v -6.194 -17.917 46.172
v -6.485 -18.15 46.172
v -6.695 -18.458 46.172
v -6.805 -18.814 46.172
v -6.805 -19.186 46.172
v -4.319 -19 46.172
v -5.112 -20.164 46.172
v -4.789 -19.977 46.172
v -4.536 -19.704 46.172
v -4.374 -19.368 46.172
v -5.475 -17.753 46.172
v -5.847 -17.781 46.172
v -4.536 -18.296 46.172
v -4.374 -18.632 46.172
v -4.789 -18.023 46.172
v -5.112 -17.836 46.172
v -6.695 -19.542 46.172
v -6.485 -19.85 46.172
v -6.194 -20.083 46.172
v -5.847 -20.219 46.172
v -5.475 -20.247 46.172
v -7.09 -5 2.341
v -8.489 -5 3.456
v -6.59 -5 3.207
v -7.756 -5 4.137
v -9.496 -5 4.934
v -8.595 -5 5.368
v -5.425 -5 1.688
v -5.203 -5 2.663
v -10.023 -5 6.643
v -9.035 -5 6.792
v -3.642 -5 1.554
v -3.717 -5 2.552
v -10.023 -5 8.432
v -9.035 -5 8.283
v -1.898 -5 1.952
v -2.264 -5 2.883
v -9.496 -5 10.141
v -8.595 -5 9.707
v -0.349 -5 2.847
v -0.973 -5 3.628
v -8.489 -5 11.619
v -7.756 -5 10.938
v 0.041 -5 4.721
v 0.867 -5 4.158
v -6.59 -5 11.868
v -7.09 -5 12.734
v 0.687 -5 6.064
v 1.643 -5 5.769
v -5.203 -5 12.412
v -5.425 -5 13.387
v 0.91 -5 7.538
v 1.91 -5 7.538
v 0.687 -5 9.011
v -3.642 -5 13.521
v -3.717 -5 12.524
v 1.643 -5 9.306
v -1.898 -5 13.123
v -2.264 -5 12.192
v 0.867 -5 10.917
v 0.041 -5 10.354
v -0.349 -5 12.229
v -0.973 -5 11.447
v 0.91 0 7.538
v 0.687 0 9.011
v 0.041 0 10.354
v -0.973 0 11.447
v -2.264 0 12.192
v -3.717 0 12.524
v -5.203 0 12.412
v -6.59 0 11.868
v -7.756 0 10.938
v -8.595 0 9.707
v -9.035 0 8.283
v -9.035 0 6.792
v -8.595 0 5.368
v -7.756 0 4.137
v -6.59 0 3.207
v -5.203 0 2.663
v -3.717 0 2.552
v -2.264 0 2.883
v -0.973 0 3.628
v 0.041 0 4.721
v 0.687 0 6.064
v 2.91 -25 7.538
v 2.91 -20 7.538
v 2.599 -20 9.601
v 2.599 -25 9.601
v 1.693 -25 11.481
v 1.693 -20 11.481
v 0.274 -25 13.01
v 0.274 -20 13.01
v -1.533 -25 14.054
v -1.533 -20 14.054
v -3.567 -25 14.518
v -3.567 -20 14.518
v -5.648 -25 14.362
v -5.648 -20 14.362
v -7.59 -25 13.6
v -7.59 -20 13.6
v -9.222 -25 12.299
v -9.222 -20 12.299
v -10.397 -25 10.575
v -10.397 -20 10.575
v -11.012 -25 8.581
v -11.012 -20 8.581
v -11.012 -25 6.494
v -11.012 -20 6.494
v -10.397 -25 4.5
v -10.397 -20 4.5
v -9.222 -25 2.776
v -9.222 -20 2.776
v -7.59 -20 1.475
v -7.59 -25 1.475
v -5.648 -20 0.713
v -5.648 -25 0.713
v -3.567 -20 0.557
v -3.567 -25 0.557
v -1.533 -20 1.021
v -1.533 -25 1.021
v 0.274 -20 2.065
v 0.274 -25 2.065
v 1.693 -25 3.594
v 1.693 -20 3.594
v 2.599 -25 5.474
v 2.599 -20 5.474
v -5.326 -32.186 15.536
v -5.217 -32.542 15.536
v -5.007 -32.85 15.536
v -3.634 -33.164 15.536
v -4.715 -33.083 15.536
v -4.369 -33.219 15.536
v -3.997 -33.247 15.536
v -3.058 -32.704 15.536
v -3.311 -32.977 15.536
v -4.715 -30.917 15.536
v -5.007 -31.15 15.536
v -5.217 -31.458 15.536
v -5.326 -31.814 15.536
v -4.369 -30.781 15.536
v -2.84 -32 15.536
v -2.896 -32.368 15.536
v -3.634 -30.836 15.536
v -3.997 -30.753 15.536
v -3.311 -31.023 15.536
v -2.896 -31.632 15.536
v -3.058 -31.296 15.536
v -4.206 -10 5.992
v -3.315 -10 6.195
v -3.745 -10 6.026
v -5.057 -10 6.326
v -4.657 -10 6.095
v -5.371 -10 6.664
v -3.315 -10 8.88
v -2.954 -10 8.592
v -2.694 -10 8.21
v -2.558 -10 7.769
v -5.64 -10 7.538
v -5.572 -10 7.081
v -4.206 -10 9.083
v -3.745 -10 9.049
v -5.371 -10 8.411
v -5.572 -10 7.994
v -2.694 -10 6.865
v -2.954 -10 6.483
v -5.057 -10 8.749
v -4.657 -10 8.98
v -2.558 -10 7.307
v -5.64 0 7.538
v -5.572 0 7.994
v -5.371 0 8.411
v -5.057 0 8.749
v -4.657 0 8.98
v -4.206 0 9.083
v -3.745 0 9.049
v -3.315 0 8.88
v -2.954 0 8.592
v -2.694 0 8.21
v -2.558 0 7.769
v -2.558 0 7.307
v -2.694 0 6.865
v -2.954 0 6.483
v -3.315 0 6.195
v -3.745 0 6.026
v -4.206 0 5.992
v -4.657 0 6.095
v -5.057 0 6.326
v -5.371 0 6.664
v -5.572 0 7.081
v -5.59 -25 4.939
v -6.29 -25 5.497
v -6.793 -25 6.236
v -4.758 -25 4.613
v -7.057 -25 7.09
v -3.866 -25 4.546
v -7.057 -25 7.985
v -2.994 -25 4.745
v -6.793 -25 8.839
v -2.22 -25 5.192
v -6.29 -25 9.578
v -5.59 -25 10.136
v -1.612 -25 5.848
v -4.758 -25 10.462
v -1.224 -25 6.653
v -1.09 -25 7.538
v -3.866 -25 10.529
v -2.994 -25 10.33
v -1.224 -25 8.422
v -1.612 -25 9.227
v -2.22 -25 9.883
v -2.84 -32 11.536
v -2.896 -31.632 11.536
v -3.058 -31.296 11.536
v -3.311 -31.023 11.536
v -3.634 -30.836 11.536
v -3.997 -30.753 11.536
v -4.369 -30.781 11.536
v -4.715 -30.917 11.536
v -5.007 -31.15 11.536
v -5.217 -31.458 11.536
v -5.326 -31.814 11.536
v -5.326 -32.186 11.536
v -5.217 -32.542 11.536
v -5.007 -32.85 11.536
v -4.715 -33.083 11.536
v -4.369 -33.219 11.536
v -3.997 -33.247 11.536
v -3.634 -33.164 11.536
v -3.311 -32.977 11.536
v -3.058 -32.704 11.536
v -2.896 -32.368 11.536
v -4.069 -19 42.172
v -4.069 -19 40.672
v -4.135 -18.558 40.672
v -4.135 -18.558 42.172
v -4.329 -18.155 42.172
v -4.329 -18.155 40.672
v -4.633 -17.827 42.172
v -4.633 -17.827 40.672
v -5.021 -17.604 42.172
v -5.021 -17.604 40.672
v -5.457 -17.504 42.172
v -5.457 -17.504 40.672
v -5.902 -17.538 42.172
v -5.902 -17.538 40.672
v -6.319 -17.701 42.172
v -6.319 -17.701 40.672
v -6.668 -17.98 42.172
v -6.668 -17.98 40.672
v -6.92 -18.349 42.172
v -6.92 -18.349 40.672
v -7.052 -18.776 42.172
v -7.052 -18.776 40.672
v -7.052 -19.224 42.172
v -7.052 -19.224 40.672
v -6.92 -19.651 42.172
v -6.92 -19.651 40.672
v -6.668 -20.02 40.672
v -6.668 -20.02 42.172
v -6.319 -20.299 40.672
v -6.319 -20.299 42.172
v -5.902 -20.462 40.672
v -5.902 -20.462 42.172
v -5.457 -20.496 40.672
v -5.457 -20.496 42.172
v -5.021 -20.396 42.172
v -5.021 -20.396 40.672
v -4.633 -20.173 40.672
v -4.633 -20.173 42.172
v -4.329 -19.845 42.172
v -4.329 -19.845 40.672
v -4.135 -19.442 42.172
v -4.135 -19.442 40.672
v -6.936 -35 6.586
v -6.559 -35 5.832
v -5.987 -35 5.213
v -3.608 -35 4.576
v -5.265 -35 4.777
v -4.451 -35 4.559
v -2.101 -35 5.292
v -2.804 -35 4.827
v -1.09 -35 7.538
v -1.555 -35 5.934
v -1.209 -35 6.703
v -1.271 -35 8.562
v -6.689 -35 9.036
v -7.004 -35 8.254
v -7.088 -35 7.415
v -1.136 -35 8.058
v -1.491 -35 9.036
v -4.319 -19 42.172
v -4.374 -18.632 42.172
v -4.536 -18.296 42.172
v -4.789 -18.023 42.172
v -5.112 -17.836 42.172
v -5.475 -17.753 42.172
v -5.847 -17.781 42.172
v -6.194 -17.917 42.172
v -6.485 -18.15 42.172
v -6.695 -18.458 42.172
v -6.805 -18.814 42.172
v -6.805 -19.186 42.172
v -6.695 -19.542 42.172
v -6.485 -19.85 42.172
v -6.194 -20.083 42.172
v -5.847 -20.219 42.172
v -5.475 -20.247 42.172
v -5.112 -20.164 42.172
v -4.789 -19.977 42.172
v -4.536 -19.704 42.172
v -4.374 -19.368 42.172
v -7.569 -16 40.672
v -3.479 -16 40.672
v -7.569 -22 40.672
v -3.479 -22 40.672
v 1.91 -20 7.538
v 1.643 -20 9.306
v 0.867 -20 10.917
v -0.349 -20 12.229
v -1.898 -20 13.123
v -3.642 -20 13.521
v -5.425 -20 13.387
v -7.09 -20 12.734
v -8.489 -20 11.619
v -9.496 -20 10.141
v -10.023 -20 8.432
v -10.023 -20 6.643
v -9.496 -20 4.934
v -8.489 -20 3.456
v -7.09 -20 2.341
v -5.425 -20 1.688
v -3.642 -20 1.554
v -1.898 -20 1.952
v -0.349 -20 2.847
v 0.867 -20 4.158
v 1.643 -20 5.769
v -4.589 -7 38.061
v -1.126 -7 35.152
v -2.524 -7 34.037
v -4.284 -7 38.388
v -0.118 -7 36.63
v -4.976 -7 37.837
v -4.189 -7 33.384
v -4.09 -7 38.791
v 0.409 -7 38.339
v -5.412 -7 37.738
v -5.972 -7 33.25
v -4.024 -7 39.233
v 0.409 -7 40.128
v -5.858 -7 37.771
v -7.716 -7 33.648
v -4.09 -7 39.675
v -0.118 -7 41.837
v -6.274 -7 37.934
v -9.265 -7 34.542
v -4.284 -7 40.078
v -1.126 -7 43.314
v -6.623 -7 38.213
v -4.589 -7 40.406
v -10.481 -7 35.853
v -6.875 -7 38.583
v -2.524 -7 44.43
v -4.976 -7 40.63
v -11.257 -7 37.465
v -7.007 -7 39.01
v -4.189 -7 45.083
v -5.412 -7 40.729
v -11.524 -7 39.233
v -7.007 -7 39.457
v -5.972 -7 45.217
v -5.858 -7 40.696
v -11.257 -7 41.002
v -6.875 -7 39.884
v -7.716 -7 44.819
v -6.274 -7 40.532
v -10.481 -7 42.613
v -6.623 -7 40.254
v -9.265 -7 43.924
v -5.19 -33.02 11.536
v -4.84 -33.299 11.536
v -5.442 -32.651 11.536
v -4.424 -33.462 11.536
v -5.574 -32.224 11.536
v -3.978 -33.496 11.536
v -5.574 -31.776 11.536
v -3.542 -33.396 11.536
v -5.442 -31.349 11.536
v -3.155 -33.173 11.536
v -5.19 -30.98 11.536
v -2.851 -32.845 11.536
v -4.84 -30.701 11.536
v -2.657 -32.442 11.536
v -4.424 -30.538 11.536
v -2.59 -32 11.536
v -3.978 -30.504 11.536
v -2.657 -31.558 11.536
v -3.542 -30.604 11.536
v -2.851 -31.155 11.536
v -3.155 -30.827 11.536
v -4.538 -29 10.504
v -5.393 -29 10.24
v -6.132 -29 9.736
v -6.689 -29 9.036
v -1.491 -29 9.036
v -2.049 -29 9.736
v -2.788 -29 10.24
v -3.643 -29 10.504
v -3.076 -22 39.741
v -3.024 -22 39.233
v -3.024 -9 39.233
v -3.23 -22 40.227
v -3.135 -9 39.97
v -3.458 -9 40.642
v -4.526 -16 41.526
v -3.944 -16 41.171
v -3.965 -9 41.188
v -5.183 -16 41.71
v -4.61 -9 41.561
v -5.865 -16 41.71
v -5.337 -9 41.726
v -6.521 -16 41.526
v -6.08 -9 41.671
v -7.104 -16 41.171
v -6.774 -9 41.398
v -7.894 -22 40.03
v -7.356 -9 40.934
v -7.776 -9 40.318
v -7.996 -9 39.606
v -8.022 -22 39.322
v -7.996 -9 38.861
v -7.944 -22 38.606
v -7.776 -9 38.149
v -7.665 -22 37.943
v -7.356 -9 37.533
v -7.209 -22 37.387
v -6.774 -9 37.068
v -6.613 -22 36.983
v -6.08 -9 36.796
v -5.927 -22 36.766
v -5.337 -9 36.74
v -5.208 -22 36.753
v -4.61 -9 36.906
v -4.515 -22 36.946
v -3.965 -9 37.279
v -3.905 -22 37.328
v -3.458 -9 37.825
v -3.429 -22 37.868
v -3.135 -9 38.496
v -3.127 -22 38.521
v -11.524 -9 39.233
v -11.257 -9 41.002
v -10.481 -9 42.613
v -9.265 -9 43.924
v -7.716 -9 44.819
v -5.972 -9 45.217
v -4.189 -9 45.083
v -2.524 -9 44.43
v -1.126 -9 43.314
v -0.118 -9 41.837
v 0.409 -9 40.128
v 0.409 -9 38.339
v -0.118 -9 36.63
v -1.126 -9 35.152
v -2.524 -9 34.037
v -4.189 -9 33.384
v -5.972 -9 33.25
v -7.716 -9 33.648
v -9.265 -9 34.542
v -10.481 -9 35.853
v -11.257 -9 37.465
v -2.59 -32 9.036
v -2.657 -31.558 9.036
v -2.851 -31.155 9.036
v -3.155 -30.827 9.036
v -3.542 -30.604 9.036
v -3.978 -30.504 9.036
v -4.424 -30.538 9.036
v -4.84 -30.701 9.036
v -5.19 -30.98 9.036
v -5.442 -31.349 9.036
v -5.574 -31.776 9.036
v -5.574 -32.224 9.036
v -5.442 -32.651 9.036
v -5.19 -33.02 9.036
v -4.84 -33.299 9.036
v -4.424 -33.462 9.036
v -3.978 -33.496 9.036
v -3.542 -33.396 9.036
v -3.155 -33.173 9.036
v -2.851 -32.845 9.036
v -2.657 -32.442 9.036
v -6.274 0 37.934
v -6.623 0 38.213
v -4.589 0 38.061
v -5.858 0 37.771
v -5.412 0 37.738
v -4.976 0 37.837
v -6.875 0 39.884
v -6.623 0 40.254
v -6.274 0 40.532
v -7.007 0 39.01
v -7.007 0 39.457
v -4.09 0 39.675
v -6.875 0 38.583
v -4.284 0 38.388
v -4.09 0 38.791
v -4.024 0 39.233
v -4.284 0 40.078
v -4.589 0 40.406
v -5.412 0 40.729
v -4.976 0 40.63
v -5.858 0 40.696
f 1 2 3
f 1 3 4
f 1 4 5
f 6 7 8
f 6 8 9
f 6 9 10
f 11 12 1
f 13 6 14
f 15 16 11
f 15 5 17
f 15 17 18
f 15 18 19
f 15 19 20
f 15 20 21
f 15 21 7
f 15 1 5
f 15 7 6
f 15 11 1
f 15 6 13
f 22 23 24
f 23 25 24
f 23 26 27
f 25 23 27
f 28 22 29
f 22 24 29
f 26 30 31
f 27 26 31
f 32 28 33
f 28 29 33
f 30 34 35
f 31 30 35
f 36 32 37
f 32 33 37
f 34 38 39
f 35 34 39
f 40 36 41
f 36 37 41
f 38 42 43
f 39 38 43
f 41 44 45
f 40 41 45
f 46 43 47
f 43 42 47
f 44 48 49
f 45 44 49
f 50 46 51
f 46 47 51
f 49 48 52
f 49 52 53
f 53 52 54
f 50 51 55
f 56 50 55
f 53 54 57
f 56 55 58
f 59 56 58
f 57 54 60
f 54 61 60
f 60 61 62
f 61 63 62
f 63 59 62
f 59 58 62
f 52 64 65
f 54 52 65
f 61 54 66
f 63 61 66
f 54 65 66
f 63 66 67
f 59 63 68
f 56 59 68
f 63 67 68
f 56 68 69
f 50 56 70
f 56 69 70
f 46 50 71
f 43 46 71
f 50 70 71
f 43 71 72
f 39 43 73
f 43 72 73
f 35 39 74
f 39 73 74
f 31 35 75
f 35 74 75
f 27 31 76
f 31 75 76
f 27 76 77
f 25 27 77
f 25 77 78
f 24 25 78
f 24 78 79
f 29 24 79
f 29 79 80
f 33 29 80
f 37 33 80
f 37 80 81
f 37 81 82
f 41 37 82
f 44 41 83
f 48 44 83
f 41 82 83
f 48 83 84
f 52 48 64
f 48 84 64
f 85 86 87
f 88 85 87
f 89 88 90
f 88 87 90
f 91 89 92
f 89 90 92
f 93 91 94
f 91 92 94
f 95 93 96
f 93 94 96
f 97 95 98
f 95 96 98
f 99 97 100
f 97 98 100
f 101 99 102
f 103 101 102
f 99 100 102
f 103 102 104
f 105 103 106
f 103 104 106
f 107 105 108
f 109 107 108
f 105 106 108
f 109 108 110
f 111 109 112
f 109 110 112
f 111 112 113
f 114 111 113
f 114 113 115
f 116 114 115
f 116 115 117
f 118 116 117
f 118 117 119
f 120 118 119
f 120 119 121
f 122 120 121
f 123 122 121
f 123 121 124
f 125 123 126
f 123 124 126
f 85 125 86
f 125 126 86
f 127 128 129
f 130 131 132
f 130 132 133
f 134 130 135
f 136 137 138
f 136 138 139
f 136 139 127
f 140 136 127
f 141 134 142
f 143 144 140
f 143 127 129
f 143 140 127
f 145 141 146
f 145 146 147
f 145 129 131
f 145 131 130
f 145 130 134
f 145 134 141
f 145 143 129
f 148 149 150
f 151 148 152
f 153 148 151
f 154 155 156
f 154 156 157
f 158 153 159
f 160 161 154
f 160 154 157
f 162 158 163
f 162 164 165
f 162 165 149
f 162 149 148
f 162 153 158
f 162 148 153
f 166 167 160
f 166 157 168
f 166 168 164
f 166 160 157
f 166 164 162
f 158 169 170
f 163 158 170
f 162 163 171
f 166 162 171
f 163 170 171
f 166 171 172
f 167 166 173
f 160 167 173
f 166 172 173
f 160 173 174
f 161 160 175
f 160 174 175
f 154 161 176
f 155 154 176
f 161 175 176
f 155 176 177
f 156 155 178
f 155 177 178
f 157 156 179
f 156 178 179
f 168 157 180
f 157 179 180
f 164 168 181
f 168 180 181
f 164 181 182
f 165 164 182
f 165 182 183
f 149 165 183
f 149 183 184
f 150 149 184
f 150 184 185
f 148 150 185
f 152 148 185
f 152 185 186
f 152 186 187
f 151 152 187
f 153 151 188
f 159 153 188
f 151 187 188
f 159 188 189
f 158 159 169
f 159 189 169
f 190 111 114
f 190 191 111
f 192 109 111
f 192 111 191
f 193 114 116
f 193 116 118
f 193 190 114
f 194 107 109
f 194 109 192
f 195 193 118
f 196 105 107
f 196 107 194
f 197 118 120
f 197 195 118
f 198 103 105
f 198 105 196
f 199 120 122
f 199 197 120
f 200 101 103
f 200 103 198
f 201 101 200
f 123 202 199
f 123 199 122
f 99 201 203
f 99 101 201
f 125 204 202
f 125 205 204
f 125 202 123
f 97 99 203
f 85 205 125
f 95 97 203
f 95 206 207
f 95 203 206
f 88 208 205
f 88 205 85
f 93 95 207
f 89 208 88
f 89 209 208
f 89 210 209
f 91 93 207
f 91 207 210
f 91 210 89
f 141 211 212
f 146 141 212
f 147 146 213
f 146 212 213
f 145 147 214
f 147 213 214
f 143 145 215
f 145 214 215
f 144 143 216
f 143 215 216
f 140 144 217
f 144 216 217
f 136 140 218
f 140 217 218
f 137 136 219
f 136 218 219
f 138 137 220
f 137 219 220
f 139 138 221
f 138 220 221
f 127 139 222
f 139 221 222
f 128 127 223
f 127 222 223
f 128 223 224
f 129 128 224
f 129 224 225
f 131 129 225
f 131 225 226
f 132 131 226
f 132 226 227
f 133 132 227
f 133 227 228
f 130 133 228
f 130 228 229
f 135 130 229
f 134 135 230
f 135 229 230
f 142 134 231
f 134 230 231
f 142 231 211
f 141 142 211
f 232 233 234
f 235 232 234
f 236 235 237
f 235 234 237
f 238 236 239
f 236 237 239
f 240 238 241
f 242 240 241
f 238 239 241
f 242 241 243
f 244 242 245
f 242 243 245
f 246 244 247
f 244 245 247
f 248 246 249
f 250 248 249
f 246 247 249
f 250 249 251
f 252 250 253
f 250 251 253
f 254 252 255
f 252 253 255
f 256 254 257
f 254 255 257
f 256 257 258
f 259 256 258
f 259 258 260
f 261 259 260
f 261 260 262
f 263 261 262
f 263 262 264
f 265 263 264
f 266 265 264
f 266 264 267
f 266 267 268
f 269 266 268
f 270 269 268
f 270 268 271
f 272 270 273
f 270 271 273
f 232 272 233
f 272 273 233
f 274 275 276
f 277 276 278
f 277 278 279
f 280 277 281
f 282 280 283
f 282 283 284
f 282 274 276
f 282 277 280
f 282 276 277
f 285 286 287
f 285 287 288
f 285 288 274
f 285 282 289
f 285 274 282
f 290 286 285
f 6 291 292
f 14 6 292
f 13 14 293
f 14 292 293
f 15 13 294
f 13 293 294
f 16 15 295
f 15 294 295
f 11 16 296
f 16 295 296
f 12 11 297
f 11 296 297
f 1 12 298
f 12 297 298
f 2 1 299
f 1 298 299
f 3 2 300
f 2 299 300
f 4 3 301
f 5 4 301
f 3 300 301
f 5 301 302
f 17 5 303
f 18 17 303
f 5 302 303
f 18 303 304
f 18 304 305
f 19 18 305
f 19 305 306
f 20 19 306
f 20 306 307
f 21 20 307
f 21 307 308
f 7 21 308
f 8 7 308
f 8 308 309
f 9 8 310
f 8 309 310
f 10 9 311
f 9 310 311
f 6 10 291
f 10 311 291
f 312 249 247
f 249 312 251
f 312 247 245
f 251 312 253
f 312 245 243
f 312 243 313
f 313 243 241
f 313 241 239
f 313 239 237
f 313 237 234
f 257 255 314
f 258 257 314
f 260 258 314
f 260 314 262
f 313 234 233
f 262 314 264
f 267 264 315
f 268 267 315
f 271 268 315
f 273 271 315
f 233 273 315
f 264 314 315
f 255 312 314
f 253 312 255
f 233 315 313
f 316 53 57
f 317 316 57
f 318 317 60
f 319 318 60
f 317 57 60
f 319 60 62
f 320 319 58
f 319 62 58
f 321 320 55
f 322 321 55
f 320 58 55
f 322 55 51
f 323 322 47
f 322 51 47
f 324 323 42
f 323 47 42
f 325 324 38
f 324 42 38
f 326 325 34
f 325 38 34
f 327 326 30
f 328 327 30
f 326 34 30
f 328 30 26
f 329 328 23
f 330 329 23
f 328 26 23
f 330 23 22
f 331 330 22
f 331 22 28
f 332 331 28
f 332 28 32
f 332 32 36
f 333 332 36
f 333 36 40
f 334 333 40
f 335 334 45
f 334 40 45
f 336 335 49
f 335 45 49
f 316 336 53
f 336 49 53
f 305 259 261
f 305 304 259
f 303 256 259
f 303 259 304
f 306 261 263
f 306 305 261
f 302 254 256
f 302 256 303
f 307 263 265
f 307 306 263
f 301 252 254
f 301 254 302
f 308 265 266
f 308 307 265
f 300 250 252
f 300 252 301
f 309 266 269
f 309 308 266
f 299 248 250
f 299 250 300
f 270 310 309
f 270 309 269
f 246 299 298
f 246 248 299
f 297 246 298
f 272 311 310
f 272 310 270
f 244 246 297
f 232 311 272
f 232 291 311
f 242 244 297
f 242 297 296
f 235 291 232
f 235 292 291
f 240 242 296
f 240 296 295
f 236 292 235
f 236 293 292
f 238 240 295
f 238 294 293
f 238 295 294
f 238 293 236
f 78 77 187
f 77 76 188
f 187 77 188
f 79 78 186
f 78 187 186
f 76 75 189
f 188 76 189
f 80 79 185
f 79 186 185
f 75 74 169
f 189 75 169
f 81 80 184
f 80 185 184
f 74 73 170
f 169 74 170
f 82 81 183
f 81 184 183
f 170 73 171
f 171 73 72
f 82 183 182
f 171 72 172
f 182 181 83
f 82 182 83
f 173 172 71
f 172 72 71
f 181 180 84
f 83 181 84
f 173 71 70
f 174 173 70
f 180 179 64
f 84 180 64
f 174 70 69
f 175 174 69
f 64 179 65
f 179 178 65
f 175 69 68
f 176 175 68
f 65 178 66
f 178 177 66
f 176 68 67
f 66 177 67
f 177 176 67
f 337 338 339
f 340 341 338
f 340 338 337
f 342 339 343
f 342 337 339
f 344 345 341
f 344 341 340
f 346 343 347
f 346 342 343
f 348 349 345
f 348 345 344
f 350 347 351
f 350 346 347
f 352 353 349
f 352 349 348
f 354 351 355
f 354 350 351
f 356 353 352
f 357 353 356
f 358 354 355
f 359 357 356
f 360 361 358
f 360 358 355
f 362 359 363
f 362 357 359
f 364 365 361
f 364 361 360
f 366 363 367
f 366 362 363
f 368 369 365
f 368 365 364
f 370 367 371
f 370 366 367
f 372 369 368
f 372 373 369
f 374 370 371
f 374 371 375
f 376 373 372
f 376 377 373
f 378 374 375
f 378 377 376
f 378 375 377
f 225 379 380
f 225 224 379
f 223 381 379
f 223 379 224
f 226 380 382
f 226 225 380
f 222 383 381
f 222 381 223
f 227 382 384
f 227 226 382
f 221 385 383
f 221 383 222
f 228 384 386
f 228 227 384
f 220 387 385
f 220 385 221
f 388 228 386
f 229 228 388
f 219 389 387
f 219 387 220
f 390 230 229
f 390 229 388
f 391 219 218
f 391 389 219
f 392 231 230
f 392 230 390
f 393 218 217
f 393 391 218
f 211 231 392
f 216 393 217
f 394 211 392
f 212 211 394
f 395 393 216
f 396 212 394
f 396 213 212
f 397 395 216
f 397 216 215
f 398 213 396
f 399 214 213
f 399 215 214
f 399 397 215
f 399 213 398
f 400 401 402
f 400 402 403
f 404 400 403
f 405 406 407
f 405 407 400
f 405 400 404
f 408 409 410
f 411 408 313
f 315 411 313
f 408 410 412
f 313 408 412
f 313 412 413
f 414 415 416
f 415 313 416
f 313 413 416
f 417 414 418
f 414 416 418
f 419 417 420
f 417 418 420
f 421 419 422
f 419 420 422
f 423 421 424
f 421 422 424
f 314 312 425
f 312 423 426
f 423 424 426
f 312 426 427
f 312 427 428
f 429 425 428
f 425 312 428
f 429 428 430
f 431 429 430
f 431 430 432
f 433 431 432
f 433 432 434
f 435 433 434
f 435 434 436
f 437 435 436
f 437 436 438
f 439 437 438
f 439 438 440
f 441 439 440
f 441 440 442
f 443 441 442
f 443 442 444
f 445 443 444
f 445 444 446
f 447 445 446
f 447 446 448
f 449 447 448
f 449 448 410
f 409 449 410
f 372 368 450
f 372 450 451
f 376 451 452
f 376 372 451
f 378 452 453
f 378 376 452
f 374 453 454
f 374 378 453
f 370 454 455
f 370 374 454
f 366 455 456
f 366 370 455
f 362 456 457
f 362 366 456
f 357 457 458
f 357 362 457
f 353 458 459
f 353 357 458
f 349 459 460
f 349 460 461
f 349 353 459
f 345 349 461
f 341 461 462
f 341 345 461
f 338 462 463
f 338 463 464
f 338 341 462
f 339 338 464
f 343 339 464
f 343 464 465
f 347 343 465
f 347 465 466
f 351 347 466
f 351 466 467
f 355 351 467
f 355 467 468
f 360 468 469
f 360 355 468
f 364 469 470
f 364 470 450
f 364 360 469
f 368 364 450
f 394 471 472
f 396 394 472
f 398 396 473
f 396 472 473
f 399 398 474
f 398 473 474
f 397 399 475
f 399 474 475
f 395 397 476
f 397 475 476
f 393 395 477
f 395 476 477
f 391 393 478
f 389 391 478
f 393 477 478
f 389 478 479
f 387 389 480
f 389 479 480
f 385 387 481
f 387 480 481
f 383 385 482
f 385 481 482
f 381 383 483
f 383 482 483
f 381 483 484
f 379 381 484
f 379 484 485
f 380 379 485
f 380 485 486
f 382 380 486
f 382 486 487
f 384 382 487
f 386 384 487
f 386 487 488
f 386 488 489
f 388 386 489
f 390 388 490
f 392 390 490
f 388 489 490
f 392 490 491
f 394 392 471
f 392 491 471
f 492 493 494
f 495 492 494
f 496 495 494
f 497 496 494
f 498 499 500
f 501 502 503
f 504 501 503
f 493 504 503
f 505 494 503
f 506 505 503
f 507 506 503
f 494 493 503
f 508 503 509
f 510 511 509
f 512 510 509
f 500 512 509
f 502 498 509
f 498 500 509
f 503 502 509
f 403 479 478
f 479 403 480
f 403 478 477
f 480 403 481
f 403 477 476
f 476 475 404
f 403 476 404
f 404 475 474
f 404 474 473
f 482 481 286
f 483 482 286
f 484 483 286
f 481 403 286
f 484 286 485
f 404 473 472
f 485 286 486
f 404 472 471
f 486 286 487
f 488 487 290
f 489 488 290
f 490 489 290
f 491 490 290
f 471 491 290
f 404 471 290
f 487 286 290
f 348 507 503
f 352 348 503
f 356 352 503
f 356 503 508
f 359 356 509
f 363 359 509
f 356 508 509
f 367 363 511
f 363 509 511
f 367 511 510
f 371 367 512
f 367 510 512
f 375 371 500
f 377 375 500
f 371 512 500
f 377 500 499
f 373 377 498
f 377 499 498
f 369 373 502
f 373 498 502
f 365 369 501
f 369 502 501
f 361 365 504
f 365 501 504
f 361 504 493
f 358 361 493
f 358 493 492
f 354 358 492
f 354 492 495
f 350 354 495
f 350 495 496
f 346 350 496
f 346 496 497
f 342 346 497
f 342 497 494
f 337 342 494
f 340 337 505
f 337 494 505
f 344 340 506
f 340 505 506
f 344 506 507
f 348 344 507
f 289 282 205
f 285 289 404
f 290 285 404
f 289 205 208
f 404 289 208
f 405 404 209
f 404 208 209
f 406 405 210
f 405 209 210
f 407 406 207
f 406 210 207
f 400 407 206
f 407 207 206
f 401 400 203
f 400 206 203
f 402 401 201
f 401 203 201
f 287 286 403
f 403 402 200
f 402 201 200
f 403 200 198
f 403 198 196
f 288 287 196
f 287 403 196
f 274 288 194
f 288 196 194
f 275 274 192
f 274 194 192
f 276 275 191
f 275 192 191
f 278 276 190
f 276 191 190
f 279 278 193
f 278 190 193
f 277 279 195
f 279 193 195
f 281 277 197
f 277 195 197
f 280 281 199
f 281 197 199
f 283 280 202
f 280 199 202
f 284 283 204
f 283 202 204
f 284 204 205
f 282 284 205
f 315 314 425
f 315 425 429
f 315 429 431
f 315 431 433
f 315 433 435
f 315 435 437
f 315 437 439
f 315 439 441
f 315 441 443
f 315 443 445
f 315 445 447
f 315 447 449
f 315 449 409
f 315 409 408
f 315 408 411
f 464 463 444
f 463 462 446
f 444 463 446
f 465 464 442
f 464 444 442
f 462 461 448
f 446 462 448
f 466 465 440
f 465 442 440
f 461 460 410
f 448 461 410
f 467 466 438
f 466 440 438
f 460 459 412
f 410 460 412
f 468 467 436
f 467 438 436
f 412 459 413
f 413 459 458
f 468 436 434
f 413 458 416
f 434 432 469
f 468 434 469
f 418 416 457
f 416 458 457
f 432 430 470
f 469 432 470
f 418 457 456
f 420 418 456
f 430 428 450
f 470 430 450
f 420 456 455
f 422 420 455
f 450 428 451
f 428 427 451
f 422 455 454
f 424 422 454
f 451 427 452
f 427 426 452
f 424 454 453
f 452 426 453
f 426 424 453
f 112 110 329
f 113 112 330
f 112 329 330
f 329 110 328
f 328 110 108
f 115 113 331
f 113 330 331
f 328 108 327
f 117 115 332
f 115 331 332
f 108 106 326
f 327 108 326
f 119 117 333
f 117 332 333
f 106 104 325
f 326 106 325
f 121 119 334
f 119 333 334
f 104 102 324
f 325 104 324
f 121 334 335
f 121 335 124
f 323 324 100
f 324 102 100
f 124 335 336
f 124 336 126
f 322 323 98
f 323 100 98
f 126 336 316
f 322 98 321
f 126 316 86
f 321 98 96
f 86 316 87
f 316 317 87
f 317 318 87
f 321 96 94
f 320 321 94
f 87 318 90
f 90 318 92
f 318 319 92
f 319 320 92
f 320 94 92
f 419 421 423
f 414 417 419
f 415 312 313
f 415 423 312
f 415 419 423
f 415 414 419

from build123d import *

# Parameters (mm, degrees)
F0_R      = 1.5
F1_DEPTH  = 7
F2_R      = 2.5
F2_R_2    = 1.5
F3_DEPTH  = 15
F5_DEPTH  = 6
F6_R      = 1.5
F7_DEPTH  = 1.5
F8_R      = 1.25
F9_DEPTH  = 4
F10_R     = 5
F11_DEPTH = 5
F12_R     = 6
F12_R_2   = 5
F13_DEPTH = 15
F14_R     = 7
F14_R_2   = 6
F15_DEPTH = 5
F16_R     = 3
F17_DEPTH = 10
F19_DEPTH = 6
F20_R     = 1.5
F21_DEPTH = 2.5
F22_R     = 1.25
F23_DEPTH = 4
F24_R     = 1.55
F25_DEPTH = 10
F26_R     = 6
F27_DEPTH = 2


with BuildPart() as f1:
    # F0 (on Front) → F1 (new body)
    with BuildSketch(Plane.XZ):
        with Locations((-5.523831, 39.233364)):
            Circle(F0_R)
    extrude(amount=F1_DEPTH)

    # F2 (on face) → F3 (join)
    with BuildSketch(Plane.XZ.offset(7)):
        with Locations((-5.523831, 39.233364)):
            Circle(F2_R)
        with Locations((-5.523831, 39.233364)):
            Circle(F2_R_2, mode=Mode.SUBTRACT)
        with Locations((-5.523831, 39.233364)):
            Circle(F2_R_2)
    extrude(amount=F3_DEPTH)

    # F4 (on face) → F5 (cut)
    with BuildSketch(Plane.XZ.offset(22)):
        with BuildLine():
            ThreePointArc((-3.478991, 40.671638), (-5.523831, 41.733364), (-7.568671, 40.671638))
            Line((-7.568671, 40.671638), (-3.478991, 40.671638))
        make_face()
    extrude(amount=-F5_DEPTH, mode=Mode.SUBTRACT)

    # F6 (on face) → F7 (join)
    with BuildSketch(Plane.XY.offset(40.671638)):
        with Locations((-5.568671, -19)):
            Circle(F6_R)
    extrude(amount=F7_DEPTH)

    # F8 (on face) → F9 (join)
    with BuildSketch(Plane.XY.offset(42.171638)):
        with Locations((-5.568671, -19)):
            Circle(F8_R)
    extrude(amount=F9_DEPTH)

    # F26 (on face) → F27 (join)
    with BuildSketch(Plane(origin=(0, -7, 0), x_dir=(-1, 0, 0), z_dir=(0, 1, 0))):
        with Locations((5.523831, 39.233364)):
            Circle(F26_R)
    extrude(amount=-F27_DEPTH)


with BuildPart() as f11:
    # F10 (on Front) → F11 (new body)
    with BuildSketch(Plane.XZ):
        with Locations((-4.090371, 7.537527)):
            Circle(F10_R)
    extrude(amount=F11_DEPTH)

    # F12 (on face) → F13 (join)
    with BuildSketch(Plane.XZ.offset(5)):
        with Locations((-4.090371, 7.537527)):
            Circle(F12_R)
        with Locations((-4.090371, 7.537527)):
            Circle(F12_R_2, mode=Mode.SUBTRACT)
        with Locations((-4.090371, 7.537527)):
            Circle(F12_R_2)
    extrude(amount=F13_DEPTH)

    # F14 (on face) → F15 (join)
    with BuildSketch(Plane.XZ.offset(20)):
        with Locations((-4.090371, 7.537527)):
            Circle(F14_R)
        with Locations((-4.090371, 7.537527)):
            Circle(F14_R_2, mode=Mode.SUBTRACT)
        with Locations((-4.090371, 7.537527)):
            Circle(F14_R_2)
    extrude(amount=F15_DEPTH)

    # F16 (on face) → F17 (join)
    with BuildSketch(Plane.XZ.offset(25)):
        with Locations((-4.090371, 7.537527)):
            Circle(F16_R)
    extrude(amount=F17_DEPTH)

    # F18 (on face) → F19 (cut)
    with BuildSketch(Plane.XZ.offset(35)):
        with BuildLine():
            ThreePointArc((-1.491391, 9.035961), (-4.090371, 10.537527), (-6.689351, 9.035961))
            Line((-6.689351, 9.035961), (-1.491391, 9.035961))
        make_face()
    extrude(amount=-F19_DEPTH, mode=Mode.SUBTRACT)

    # F20 (on face) → F21 (join)
    with BuildSketch(Plane.XY.offset(9.035961)):
        with Locations((-4.090371, -32)):
            Circle(F20_R)
    extrude(amount=F21_DEPTH)

    # F22 (on face) → F23 (join)
    with BuildSketch(Plane.XY.offset(11.535961)):
        with Locations((-4.090371, -32)):
            Circle(F22_R)
    extrude(amount=F23_DEPTH)

    # F24 (on face) → F25 (cut)
    with BuildSketch(Plane(origin=(0, 0, 0), x_dir=(-1, 0, 0), z_dir=(0, 1, 0))):
        with Locations((4.090371, 7.537527)):
            Circle(F24_R)
    extrude(amount=-F25_DEPTH, mode=Mode.SUBTRACT)


solid = Compound([f1.part, f11.part])
